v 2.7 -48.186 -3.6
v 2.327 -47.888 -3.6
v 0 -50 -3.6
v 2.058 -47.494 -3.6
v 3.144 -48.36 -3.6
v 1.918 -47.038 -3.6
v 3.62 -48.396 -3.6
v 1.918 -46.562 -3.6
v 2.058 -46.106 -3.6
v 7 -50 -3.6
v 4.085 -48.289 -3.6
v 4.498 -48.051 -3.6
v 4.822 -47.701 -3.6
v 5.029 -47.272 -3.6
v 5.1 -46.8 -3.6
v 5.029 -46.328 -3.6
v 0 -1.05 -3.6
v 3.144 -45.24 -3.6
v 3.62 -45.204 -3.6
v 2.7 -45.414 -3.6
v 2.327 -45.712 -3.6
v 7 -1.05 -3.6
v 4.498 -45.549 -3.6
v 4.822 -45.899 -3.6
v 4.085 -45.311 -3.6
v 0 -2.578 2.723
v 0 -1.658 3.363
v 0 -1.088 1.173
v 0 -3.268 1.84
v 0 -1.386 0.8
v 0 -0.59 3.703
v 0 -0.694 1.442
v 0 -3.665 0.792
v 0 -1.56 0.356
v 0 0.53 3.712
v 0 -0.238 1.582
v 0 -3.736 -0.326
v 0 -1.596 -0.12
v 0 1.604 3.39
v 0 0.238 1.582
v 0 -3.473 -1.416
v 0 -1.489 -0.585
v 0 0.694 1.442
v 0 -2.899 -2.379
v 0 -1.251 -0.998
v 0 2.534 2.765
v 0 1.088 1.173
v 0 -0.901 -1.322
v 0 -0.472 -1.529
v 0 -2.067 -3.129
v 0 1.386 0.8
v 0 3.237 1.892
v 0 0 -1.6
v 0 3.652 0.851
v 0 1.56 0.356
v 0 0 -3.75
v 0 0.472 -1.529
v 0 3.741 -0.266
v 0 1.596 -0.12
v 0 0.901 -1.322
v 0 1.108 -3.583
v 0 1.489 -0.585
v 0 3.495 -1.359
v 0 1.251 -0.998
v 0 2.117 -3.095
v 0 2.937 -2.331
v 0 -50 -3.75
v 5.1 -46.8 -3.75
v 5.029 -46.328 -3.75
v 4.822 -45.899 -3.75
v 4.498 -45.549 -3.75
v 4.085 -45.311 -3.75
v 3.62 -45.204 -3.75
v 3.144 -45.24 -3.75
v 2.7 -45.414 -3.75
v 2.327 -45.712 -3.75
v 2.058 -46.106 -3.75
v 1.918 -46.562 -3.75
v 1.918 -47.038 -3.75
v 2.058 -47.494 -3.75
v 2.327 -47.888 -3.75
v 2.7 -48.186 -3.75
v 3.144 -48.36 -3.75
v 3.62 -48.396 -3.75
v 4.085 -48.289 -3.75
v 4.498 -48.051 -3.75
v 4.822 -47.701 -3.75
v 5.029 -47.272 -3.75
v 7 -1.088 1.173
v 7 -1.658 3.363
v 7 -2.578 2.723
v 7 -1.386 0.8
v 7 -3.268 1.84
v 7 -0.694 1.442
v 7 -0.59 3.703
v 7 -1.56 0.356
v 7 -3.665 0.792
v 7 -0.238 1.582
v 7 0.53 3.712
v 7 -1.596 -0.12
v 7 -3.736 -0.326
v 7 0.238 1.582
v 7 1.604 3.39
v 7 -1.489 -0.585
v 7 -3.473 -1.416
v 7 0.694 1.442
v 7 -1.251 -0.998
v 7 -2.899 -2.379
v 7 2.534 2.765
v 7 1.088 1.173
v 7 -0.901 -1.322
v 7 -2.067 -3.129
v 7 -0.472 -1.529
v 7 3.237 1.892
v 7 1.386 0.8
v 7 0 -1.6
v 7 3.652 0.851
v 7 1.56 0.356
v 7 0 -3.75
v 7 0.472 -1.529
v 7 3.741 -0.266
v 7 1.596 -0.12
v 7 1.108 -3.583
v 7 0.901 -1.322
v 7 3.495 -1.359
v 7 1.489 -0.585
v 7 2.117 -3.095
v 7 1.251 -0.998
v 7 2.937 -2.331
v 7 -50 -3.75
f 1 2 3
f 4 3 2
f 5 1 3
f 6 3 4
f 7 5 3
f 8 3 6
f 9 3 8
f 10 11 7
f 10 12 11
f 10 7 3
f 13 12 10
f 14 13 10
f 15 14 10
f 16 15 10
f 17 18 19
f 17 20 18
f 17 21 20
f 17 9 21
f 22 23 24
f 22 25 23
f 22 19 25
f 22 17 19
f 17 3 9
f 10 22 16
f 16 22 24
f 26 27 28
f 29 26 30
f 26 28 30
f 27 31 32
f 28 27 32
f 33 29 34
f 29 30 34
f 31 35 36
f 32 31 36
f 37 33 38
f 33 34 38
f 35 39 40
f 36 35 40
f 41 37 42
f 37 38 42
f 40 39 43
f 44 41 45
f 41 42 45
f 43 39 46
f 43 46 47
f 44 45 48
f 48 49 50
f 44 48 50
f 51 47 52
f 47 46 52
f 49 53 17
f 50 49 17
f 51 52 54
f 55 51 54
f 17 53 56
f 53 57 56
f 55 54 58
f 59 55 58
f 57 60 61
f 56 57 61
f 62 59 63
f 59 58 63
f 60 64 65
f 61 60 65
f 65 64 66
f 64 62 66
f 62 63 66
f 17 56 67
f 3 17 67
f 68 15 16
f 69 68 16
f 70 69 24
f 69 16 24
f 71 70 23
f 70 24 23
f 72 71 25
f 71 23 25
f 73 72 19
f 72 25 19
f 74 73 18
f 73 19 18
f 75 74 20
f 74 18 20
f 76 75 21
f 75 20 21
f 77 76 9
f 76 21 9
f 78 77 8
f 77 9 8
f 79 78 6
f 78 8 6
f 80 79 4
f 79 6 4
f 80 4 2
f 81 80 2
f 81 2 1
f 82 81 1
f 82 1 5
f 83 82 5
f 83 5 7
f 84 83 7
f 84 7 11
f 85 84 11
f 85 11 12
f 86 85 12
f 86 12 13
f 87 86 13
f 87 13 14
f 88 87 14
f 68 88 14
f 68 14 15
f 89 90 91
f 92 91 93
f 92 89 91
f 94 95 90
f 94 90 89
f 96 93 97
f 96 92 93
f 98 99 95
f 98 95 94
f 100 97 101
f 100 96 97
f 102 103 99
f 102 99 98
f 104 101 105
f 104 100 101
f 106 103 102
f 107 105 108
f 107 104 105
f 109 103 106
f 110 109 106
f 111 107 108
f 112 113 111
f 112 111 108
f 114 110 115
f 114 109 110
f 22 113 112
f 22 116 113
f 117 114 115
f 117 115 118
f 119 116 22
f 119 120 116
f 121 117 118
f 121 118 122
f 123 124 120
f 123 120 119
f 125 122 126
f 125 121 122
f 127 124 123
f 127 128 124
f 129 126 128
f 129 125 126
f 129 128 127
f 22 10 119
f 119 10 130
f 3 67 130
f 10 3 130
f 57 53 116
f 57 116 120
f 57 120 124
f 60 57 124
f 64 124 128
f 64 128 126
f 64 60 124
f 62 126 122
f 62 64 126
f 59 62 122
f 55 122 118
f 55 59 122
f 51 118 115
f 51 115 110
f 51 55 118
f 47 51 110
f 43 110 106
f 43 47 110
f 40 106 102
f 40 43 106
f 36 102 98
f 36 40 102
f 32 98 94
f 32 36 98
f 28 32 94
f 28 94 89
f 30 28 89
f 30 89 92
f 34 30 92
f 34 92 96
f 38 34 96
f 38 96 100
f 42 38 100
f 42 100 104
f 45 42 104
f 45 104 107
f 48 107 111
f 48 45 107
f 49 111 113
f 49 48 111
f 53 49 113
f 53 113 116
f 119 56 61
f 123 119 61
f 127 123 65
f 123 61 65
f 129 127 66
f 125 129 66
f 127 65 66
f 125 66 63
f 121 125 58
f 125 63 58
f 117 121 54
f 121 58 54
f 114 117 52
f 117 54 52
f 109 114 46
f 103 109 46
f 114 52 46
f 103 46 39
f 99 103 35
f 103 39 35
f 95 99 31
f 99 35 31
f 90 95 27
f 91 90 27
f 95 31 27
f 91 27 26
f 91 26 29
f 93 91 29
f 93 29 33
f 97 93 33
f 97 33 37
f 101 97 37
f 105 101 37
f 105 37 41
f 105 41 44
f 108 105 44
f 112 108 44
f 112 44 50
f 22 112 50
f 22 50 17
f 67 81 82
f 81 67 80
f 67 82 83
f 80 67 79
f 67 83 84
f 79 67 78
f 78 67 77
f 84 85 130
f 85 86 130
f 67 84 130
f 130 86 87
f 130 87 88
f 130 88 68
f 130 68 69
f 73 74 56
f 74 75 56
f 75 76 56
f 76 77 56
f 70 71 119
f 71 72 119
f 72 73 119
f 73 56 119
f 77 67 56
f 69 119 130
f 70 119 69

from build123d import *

# Parameters (mm, degrees)
SKETCH_1_R          = 3.75
SKETCH_1_R_2        = 1.6
EXTRUDE_1_DEPTH     = 7
SKETCH_2_W          = 7
SKETCH_2_H          = 0.15
EXTRUDE_2_DEPTH     = 50
SKETCH_3_R          = 1.6
CUT_EXTRUDE_1_DEPTH = 52.019824578


with BuildPart() as part:
    # 草图1 → 凸台-拉伸1 (new body)
    with BuildSketch(Plane(origin=(0, 0, 0), x_dir=(0, 0, -1), z_dir=(1, 0, 0))):
        Circle(SKETCH_1_R)
        Circle(SKETCH_1_R_2, mode=Mode.SUBTRACT)
    extrude(amount=EXTRUDE_1_DEPTH)

    # 草图2 → 凸台-拉伸2 (add)
    with BuildSketch(Plane(origin=(0, 0, 0), x_dir=(1, 0, 0), z_dir=(0, 1, 0))):
        with Locations((3.5, 3.675)):
            Rectangle(SKETCH_2_W, SKETCH_2_H)
    extrude(amount=-EXTRUDE_2_DEPTH)

    # 草图3 → 切除-拉伸1 (cut, through all)
    with BuildSketch(Plane.XY.offset(-3.6)):
        with Locations((3.5, -46.8)):
            Circle(SKETCH_3_R)
    extrude(amount=-CUT_EXTRUDE_1_DEPTH, mode=Mode.SUBTRACT)


solid = part.part
